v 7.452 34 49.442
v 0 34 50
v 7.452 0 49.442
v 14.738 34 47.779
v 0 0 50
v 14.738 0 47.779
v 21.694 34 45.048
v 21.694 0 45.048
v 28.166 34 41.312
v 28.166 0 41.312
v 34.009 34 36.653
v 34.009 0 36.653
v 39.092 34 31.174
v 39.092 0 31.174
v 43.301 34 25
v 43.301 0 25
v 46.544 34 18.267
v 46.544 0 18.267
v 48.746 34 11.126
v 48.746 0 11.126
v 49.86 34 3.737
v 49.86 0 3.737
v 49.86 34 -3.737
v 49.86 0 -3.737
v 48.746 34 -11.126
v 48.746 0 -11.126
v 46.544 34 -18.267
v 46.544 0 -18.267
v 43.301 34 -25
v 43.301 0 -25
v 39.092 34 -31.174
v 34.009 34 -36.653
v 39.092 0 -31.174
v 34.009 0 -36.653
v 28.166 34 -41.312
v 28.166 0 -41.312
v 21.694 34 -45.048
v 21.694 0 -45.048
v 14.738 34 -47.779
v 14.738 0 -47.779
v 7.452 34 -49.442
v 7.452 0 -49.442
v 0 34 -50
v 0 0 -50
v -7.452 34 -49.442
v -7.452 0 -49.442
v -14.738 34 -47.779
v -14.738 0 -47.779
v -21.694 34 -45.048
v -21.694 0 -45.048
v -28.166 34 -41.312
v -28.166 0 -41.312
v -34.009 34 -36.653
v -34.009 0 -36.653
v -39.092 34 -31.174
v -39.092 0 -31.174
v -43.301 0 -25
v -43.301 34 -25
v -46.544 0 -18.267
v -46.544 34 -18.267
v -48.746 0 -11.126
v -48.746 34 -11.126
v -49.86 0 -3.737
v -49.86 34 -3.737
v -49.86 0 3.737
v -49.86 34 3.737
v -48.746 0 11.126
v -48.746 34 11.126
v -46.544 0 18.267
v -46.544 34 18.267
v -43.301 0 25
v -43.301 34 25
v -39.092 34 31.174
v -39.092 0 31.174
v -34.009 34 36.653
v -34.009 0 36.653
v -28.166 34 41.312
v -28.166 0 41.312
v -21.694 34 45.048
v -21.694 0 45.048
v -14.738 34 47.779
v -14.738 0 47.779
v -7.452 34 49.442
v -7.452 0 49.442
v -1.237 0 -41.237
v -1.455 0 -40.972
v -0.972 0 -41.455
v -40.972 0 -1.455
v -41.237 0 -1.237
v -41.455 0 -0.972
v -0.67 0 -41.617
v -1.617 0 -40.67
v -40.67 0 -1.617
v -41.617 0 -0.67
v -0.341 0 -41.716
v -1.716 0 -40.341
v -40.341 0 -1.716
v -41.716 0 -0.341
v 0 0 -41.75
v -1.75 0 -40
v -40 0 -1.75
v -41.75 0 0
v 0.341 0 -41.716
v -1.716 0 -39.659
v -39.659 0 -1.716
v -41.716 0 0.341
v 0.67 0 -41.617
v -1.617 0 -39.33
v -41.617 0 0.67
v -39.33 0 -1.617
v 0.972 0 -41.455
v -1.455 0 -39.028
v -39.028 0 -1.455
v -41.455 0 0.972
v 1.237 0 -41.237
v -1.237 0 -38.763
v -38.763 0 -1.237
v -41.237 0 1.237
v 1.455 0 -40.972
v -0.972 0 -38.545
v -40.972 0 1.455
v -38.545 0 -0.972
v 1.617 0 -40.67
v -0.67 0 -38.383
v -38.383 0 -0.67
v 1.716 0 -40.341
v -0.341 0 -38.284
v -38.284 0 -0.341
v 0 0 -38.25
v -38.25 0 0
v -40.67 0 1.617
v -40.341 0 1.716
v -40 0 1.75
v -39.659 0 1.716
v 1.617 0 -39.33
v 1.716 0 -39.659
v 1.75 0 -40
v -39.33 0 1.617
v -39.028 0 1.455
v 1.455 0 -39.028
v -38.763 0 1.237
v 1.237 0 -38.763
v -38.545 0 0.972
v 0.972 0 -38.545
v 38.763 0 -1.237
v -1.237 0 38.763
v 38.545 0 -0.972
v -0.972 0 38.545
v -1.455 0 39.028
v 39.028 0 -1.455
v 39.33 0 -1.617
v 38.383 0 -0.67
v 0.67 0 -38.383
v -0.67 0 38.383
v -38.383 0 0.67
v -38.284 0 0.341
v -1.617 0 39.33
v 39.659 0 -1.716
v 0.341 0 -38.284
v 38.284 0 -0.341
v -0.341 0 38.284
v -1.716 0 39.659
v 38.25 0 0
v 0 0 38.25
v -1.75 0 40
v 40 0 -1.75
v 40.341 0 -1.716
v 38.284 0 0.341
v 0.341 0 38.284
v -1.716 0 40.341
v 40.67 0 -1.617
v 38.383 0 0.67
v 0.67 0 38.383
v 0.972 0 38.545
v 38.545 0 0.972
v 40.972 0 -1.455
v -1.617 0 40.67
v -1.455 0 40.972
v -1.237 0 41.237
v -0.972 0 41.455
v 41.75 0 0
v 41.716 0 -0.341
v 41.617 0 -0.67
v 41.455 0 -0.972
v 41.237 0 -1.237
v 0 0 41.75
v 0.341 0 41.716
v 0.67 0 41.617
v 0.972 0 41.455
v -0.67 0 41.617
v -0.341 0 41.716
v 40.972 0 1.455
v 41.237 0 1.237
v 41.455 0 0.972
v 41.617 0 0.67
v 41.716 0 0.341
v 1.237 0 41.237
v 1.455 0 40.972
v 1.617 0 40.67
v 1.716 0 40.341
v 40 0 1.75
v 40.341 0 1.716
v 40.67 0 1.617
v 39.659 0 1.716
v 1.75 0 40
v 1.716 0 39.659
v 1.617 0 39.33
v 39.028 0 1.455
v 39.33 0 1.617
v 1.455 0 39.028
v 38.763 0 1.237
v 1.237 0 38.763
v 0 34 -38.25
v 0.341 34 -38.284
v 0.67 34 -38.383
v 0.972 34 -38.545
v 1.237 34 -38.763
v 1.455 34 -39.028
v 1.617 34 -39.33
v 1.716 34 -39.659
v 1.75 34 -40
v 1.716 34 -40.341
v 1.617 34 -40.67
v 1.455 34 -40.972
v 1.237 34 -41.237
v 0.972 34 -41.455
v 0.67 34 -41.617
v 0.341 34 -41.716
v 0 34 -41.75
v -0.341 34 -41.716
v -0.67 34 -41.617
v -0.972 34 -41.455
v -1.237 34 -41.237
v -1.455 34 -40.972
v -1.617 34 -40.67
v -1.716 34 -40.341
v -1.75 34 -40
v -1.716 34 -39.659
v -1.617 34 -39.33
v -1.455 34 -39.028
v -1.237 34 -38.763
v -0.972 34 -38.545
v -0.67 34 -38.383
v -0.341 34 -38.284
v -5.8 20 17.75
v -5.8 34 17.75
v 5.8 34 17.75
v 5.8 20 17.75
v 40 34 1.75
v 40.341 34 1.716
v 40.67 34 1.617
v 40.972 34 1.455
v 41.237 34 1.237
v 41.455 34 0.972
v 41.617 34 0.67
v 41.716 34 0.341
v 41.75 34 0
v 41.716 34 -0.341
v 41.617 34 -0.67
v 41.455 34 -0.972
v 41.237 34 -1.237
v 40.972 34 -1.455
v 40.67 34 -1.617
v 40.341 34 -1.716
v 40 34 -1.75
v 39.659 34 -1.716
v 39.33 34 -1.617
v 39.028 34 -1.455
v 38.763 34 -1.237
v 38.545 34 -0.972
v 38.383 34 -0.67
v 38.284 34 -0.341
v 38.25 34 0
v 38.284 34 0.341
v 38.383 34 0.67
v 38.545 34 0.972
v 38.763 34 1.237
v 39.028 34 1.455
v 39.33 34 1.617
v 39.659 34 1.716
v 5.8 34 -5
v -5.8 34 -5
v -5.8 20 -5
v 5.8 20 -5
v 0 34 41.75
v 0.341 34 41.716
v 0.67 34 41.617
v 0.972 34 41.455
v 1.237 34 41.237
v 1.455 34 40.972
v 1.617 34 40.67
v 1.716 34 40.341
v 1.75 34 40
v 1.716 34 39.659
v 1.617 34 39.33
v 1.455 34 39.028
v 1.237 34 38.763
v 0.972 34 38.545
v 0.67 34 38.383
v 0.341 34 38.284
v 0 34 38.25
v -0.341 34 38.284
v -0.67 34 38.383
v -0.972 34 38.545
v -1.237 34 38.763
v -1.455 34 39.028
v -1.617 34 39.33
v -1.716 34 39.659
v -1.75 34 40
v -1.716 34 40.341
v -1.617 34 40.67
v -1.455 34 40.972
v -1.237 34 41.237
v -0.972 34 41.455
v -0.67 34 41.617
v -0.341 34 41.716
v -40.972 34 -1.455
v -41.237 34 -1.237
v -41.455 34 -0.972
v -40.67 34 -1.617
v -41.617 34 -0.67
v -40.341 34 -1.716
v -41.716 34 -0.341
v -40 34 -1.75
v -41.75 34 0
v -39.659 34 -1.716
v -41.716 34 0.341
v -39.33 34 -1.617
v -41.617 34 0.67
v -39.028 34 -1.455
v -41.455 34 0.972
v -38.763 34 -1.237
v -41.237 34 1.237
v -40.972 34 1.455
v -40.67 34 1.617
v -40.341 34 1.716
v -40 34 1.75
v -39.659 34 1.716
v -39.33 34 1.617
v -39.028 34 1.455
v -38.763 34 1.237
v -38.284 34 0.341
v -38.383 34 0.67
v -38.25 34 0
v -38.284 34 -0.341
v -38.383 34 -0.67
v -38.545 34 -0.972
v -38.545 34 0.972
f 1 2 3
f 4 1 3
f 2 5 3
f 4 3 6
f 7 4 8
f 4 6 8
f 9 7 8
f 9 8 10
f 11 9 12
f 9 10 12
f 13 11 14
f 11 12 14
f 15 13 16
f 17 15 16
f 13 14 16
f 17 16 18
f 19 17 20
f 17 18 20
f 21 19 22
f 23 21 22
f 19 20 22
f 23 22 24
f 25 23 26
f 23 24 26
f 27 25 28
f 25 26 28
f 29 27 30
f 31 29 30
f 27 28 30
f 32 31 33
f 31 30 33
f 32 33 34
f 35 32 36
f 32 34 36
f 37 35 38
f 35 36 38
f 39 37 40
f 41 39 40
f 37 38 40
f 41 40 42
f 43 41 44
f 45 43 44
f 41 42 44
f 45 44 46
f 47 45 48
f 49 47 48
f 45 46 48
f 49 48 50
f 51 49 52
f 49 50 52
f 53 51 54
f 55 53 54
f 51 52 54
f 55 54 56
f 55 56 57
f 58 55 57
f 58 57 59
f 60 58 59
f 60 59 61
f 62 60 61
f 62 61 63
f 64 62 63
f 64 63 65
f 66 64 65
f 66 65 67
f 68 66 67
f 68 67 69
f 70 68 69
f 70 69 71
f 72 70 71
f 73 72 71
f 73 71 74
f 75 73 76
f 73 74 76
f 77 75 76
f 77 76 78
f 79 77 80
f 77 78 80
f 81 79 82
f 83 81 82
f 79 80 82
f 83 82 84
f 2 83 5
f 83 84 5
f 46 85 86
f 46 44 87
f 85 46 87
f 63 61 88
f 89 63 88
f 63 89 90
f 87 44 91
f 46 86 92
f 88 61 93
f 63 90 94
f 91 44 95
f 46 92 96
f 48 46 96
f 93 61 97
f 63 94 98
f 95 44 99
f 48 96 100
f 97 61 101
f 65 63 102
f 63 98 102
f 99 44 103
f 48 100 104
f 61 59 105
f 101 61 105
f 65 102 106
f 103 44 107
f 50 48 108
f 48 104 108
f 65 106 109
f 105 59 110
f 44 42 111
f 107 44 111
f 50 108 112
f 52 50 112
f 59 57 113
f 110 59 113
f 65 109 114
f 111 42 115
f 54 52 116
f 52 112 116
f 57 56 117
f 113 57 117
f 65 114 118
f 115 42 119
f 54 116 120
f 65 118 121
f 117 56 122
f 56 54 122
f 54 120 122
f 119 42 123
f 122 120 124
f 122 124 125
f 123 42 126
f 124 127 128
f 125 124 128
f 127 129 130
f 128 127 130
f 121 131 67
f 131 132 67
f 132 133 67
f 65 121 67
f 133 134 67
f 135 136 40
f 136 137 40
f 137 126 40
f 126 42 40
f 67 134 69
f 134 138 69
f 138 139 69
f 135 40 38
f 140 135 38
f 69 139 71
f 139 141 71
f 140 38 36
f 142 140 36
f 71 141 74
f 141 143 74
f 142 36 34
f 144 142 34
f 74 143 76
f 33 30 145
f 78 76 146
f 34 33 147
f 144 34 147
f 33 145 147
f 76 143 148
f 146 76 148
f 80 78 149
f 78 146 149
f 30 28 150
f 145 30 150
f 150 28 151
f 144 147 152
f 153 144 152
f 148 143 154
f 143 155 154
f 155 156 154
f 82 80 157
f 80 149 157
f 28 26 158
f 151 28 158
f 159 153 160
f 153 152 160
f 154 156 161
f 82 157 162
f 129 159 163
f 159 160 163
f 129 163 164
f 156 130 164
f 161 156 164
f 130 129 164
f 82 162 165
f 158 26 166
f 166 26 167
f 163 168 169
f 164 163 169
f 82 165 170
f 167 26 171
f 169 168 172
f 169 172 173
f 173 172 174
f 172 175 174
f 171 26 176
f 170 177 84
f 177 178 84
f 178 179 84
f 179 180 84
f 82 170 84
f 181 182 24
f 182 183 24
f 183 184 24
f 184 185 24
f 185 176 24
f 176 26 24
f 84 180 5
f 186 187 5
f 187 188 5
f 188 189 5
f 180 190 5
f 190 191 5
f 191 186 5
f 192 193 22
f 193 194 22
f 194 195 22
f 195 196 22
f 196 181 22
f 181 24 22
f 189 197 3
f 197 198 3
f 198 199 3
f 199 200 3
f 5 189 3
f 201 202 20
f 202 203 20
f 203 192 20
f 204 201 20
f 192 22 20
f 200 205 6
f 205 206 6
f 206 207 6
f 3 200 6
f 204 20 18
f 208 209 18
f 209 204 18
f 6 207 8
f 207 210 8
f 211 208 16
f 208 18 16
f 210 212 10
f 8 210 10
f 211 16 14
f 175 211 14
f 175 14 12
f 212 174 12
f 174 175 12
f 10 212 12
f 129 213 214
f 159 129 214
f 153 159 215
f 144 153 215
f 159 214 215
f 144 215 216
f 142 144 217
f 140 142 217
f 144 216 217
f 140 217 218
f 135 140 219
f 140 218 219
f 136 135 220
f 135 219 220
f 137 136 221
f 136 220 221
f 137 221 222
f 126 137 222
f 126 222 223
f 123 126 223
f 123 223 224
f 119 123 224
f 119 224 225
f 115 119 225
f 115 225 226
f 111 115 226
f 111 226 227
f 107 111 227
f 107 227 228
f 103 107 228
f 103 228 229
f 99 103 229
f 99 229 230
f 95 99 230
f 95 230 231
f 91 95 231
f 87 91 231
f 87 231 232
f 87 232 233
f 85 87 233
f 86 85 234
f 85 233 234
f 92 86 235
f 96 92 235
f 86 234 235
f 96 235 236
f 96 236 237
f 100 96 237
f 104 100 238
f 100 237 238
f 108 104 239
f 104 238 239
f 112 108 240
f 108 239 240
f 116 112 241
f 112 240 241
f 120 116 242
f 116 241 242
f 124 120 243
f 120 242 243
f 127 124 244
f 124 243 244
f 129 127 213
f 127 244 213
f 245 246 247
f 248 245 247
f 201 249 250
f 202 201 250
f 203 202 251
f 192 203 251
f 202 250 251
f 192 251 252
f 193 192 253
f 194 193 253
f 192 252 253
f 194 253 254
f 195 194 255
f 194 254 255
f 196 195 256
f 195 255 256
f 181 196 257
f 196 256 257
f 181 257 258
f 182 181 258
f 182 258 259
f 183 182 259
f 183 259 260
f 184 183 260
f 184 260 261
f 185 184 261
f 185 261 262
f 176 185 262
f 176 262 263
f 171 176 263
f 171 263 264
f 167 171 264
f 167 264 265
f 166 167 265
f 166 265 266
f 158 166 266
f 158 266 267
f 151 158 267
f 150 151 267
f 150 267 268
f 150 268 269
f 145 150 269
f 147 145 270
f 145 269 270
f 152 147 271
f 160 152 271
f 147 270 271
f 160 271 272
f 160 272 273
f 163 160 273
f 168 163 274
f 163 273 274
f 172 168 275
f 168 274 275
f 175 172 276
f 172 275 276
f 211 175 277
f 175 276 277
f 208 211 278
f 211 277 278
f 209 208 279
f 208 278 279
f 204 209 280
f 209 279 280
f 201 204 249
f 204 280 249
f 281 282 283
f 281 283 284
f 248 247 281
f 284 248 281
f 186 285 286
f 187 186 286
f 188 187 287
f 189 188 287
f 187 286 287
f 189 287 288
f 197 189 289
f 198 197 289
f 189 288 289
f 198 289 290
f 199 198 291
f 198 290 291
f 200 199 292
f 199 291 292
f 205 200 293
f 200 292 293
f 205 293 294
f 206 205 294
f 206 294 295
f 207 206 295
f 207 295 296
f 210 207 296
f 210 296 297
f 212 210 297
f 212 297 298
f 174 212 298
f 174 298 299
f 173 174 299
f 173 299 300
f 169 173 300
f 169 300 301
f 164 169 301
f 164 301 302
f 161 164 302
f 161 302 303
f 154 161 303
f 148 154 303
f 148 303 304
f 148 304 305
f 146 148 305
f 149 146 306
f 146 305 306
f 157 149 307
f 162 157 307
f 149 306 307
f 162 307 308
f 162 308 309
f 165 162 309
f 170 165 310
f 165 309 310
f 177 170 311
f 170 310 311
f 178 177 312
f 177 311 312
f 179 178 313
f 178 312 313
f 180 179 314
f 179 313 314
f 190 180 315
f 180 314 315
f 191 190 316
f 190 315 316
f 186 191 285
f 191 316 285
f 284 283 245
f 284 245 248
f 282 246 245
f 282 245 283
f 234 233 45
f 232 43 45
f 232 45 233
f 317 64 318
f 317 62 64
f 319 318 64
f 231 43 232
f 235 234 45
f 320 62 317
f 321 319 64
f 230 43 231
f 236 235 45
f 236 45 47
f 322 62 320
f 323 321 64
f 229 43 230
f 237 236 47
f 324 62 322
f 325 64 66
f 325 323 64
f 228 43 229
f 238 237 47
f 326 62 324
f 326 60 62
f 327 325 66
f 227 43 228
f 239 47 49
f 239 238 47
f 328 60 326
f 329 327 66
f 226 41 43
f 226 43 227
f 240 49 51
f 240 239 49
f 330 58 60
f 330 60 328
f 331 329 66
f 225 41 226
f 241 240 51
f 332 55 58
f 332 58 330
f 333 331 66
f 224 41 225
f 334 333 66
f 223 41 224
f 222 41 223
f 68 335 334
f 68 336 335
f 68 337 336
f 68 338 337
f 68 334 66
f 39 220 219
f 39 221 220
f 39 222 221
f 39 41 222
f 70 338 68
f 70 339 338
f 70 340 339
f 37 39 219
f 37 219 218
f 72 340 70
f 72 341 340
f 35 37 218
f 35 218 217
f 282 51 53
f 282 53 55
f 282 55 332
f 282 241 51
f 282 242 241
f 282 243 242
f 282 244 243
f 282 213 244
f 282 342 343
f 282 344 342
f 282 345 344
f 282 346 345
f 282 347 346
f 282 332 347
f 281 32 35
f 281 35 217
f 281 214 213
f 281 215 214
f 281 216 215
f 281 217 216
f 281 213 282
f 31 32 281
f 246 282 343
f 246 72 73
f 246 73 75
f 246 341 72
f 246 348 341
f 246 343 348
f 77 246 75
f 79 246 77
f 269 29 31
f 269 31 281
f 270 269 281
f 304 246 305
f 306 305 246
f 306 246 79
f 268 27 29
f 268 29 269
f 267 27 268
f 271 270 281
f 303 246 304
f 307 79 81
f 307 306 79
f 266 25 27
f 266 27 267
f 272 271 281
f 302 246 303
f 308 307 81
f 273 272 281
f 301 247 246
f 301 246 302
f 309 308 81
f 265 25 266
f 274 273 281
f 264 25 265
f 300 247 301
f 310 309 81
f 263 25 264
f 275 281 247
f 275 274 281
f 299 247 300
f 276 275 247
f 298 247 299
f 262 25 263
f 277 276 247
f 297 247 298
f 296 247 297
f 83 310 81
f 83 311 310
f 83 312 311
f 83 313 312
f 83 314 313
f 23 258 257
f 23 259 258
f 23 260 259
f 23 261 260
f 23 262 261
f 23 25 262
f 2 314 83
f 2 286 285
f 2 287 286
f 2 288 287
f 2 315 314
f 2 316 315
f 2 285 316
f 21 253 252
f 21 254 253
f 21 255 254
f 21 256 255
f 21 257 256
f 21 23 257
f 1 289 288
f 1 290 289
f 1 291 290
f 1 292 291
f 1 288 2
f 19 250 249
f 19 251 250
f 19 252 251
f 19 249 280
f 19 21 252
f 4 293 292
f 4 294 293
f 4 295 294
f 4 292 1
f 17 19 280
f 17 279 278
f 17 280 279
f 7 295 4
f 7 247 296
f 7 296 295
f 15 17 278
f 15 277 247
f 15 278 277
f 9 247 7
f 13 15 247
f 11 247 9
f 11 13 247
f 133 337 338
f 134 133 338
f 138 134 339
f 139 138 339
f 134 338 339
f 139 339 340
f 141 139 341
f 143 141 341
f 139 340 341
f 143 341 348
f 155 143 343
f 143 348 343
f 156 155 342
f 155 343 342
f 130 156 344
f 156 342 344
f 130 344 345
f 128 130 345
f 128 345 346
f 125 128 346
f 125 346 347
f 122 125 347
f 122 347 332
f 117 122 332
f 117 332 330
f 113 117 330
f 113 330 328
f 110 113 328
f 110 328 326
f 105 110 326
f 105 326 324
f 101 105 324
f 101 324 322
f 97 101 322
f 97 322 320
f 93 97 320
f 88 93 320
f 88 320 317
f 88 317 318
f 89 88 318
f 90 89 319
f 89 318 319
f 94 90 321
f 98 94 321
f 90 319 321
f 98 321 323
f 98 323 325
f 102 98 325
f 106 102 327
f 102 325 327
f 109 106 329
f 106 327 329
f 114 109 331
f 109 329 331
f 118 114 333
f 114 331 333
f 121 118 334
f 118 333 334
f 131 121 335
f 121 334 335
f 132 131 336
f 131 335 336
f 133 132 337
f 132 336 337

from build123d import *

# Parameters (mm, degrees)
SKETCH1_R           = 50
BOSS_EXTRUDE1_DEPTH = 30
SKETCH2_R           = 50
BOSS_EXTRUDE2_DEPTH = 4
SKETCH3_W           = 11.6
SKETCH3_H           = 22.75
CUT_EXTRUDE1_DEPTH  = 14
SKETCH5_R           = 1.75
CUT_EXTRUDE3_DEPTH  = 79.460180984


with BuildPart() as part:
    # Sketch1 → Boss-Extrude1 (new body)
    with BuildSketch(Plane(origin=(0, 0, 0), x_dir=(1, 0, 0), z_dir=(0, 1, 0))):
        with Locations(Location((0, 0, 0), (0, 0, 270))):
            Circle(SKETCH1_R)
    extrude(amount=BOSS_EXTRUDE1_DEPTH)

    # Sketch2 → Boss-Extrude2 (add)
    with BuildSketch(Plane(origin=(0, 30, 0), x_dir=(1, 0, 0), z_dir=(0, 1, 0))):
        with Locations(Location((0, 0, 0), (0, 0, 270))):
            Circle(SKETCH2_R)
    extrude(amount=BOSS_EXTRUDE2_DEPTH)

    # Sketch3 → Cut-Extrude1 (cut)
    with BuildSketch(Plane(origin=(0, 34, 0), x_dir=(1, 0, 0), z_dir=(0, 1, 0))):
        with Locations((0, -6.375)):
            Rectangle(SKETCH3_W, SKETCH3_H)
    extrude(amount=-CUT_EXTRUDE1_DEPTH, mode=Mode.SUBTRACT)

    # Sketch5 → Cut-Extrude3 (cut, through all)
    with BuildSketch(Plane(origin=(0, 34, 0), x_dir=(1, 0, 0), z_dir=(0, 1, 0))):
        with Locations(Location((0, 40, 0), (0, 0, 270))):
            Circle(SKETCH5_R)
        with Locations(Location((40, 0, 0), (0, 0, 270))):
            Circle(SKETCH5_R)
        with Locations(Location((0, -40, 0), (0, 0, 270))):
            Circle(SKETCH5_R)
        with Locations(Location((-40, 0, 0), (0, 0, 270))):
            Circle(SKETCH5_R)
    extrude(amount=-CUT_EXTRUDE3_DEPTH, mode=Mode.SUBTRACT)


solid = part.part
